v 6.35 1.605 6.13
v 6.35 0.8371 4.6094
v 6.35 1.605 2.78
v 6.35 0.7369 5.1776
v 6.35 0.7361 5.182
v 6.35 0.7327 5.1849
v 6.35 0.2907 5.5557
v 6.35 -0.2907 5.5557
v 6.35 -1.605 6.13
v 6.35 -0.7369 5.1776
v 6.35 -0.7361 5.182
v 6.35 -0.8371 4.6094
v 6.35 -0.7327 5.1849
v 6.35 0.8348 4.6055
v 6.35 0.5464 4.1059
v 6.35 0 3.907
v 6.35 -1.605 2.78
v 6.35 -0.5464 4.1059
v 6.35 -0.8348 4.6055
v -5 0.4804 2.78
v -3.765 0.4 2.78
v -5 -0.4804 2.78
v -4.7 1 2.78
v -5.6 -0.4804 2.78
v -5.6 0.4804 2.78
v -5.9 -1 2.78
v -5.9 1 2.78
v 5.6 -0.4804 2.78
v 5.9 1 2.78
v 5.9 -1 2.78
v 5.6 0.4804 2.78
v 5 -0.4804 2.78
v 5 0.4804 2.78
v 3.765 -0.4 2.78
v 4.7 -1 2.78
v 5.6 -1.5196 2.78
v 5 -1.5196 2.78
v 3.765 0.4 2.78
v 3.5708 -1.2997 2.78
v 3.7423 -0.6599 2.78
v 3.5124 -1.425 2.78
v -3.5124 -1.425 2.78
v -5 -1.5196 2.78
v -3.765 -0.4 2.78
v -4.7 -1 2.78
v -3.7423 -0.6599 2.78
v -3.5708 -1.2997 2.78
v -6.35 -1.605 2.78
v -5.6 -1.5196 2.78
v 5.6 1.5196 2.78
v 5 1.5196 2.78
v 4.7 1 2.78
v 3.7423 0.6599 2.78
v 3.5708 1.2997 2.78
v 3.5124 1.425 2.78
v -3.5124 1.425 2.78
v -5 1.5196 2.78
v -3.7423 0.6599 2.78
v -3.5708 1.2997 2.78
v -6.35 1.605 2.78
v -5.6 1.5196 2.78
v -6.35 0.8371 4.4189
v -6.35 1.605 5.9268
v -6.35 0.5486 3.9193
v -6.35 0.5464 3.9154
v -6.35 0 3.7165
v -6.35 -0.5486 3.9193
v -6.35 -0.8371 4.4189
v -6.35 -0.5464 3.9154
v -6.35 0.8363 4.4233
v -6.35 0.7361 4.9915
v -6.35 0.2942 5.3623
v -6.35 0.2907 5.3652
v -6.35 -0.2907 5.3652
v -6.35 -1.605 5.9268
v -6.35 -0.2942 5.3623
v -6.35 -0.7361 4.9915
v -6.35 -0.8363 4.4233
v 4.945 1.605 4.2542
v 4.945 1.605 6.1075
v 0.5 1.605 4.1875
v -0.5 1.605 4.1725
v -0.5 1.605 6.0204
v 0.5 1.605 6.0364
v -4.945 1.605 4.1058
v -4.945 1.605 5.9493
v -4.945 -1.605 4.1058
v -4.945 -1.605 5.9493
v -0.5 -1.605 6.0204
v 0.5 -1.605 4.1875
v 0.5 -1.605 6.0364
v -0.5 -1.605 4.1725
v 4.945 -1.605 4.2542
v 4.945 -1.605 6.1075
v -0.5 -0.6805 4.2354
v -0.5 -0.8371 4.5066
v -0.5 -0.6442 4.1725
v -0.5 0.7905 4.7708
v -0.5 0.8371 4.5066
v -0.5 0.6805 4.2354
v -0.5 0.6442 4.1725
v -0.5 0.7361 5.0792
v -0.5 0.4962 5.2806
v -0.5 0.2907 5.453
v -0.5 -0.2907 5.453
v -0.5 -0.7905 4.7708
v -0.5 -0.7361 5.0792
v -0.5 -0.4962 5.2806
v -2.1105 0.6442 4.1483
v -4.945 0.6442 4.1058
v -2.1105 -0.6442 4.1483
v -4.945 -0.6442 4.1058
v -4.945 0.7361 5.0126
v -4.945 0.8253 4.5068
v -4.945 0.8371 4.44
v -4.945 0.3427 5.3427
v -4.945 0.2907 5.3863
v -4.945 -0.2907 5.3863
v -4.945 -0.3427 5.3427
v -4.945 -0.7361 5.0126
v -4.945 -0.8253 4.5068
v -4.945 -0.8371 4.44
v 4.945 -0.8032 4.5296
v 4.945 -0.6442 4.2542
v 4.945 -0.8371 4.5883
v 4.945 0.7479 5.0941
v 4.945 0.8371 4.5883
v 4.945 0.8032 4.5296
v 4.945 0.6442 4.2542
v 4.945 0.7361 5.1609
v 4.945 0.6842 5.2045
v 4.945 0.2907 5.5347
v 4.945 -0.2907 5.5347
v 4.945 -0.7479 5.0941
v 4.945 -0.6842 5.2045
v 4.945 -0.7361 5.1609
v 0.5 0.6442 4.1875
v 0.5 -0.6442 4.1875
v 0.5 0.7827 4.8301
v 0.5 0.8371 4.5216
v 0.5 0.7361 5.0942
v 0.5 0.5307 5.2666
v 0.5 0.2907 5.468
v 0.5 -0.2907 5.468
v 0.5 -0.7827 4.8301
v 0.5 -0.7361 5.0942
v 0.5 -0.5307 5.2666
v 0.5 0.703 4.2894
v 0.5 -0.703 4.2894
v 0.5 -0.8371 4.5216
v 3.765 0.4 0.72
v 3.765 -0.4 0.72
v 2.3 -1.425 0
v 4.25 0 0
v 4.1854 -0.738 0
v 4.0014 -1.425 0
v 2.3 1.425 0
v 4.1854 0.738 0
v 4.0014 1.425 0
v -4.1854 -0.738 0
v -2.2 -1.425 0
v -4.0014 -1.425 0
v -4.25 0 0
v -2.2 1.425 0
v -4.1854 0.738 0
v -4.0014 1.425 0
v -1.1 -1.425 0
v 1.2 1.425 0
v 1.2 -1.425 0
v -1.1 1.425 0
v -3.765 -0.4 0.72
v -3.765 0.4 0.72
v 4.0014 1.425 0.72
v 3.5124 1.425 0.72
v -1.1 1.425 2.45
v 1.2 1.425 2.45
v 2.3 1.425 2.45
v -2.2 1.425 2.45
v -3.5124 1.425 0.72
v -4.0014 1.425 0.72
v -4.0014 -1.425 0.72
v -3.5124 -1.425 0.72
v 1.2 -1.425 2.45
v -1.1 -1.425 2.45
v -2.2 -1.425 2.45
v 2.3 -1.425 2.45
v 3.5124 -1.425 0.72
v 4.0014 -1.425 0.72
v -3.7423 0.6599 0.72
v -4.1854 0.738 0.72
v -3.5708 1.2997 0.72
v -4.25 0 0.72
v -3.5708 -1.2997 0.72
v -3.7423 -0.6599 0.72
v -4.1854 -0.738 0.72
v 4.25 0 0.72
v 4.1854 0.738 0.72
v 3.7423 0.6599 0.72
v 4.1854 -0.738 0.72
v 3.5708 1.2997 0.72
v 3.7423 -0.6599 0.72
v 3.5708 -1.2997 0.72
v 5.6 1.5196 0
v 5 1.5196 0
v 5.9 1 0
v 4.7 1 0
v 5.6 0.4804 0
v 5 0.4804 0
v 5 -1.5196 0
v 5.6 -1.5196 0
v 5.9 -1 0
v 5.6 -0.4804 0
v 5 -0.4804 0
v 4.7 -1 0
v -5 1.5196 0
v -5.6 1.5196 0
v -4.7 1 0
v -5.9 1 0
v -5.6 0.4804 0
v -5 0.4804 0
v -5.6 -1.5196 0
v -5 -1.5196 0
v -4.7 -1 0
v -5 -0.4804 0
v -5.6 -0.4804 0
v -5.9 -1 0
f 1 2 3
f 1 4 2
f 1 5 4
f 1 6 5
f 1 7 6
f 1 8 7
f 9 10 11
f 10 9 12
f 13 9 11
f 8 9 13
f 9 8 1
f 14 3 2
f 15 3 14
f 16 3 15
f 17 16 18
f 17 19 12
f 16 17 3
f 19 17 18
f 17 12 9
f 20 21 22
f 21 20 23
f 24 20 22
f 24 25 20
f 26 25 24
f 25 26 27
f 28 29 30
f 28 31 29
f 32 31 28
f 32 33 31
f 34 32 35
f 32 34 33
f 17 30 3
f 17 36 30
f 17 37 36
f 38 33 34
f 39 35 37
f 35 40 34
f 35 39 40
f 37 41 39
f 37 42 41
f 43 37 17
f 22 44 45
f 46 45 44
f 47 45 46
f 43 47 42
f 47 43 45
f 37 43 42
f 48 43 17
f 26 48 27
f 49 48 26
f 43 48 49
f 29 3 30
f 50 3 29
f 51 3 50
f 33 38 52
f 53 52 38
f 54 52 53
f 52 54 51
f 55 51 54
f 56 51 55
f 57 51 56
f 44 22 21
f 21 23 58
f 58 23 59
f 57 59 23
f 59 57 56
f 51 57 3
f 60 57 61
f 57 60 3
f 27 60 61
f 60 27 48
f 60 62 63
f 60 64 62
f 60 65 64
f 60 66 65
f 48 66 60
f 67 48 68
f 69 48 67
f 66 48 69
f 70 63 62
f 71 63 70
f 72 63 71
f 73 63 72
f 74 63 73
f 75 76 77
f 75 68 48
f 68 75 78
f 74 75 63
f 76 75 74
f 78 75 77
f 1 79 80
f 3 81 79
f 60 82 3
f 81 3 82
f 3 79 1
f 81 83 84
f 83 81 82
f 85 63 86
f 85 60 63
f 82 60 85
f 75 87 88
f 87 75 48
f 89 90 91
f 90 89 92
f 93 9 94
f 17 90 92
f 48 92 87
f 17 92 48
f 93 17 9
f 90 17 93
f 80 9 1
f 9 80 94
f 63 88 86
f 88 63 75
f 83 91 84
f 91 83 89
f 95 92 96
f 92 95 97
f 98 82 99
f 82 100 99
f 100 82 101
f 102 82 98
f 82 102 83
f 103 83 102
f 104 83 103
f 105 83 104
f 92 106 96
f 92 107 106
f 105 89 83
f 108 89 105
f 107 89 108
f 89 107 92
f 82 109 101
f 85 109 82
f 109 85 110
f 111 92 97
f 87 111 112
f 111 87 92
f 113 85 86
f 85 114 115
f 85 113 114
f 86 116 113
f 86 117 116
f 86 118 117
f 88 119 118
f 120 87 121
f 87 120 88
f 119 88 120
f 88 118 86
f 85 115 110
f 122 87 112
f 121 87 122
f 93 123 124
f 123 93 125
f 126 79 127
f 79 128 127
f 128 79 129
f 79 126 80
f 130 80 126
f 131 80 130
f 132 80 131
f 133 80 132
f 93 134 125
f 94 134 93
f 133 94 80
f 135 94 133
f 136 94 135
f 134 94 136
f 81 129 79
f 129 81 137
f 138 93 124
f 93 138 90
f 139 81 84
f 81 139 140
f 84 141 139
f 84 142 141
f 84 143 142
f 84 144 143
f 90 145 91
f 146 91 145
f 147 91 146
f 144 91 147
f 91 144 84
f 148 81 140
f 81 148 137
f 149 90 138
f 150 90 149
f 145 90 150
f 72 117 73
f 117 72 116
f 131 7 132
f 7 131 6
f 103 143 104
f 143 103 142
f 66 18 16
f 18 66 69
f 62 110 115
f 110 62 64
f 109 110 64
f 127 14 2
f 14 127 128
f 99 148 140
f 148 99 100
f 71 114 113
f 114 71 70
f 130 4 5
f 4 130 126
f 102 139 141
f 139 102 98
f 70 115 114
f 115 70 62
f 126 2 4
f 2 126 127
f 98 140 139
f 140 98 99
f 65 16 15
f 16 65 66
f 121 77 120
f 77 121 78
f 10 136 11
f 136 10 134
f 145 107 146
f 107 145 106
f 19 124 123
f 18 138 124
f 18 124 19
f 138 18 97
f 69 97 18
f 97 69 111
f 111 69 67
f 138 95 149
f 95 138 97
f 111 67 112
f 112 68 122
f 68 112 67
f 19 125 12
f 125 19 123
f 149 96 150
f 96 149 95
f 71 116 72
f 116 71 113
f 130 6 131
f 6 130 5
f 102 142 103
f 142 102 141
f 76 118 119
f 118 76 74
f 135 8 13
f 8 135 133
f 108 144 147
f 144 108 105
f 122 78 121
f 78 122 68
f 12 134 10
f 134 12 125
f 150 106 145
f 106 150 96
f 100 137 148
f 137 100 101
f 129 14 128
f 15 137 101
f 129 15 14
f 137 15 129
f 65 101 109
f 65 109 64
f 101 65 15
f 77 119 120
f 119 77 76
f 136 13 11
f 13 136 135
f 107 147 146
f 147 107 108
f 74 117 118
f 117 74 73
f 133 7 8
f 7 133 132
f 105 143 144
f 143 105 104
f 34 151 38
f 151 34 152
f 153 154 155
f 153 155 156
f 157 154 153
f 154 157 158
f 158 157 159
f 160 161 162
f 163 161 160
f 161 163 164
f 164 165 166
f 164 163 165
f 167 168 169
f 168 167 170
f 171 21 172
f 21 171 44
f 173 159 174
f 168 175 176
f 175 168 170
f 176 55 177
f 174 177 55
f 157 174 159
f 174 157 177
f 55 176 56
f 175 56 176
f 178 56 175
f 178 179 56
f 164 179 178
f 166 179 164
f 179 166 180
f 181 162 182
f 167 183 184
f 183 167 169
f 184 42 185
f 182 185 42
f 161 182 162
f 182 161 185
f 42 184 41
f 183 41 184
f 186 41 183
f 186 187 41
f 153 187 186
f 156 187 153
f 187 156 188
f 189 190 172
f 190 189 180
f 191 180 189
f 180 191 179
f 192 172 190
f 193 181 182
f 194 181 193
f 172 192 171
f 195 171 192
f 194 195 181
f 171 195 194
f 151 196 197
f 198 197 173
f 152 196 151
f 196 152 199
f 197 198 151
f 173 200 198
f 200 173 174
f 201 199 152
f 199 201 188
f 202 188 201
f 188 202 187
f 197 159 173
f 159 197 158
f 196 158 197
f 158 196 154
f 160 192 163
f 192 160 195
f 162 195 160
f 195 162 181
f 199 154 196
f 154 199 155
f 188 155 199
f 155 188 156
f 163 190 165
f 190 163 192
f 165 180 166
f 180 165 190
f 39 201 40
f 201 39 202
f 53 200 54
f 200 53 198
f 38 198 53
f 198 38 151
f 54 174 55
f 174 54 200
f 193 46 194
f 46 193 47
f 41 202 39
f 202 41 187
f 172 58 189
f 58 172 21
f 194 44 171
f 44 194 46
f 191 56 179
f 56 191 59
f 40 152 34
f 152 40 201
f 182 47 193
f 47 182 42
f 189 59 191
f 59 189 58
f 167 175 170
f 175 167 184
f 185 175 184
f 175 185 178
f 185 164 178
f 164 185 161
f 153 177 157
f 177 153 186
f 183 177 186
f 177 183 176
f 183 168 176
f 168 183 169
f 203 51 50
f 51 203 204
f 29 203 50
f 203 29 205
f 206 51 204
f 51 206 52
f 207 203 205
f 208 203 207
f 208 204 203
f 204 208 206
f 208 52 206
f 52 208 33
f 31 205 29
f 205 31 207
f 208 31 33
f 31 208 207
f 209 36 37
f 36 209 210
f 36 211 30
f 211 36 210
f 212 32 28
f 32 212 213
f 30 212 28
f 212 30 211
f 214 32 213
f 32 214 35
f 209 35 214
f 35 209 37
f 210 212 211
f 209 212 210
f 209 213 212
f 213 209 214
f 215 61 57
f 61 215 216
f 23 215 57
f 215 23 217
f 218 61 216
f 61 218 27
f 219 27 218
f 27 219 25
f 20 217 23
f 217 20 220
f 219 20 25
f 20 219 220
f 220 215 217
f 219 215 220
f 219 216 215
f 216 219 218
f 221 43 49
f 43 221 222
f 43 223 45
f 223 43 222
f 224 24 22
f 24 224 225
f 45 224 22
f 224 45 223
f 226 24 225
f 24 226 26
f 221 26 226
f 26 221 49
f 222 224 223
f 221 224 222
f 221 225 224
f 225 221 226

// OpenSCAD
// Browning 1911-22/1911-380 (not "Pro"), the front sight with fiber optics

stock_width = 3.21;
stock_length = 12.7;
stock_height = 3.35; // rear only - remember that sight must be slanted

// The following two measurements set the slant when used with stock_height.
// front_height = 2.47;
// front_length = 10.54;
// shear = (stock_height - front_height) / front_length;

// We do not repeat the shear of the stock front sight, because it's far
// in excess of the sight line. Instead, we aim the rod (almost) along
// the sight line, so it transmits the most lights to the shooter's eye.
// The top is sheared just a smidge more, so it can't be seen when aiming,
// but not more than that.
shear_rod = 0.015;
shear_top = shear_rod + 0.001;

rod_dia = 1.5 + 0.2;

pawl_z = 2.78;

module rod_channel () {
    $fn = 9;
    rotate(90, [0, 1, 0])
        cylinder(stock_length+0.2, rod_dia/2, rod_dia/2);
}

module rod_slot () {
    // translate([0, (rod_dia*1.3)/2)*-1, 0])
    //     cube([stock_length*0.35, rod_dia*1.3, 7]);

    // This version cuts away everything, in order to collect more light.
    translate([0, ((stock_width+0.2)/2)*-1, 0])
        cube([stock_length*0.35, stock_width+0.2, 7]);
}

// We center the whole part on the center of the attachment.
module main_body () {

    difference () {
        // The main body. Everything else attaches to it. Up is up for now.
        intersection () {
            translate([(stock_length/2)*-1, (stock_width/2)*-1, 0])
                cube([stock_length, stock_width, stock_height]);
            translate([(stock_length/2)*-1, (stock_width/2)*-1,
                       (shear_top*stock_length)*-1])
                multmatrix(m = [[        1,   0,   0,   0],
                                [        0,   1,   0,   0],
                                [shear_top,   0,   1,   0],
                                [        0,   0,   0,   1]])
                {
                    cube([stock_length, stock_width, stock_height]);
                }
        }

        // The rod channel.
        translate([(stock_length/2 + 0.1)*-1, 0,
                    stock_height - stock_width/2 + 0.04]) {
            multmatrix(m = [[        1,   0,   0,   0],
                            [        0,   1,   0,   0],
                            [shear_rod,   0,   1,   0],
                            [        0,   0,   0,   1]])
            {
                rod_channel();
            }
        }

        translate([0, 0, 1.2]) {
            multmatrix(m = [[        1,   0,   0,   0],
                            [        0,   1,   0,   0],
                            [shear_rod,   0,   1,   0],
                            [        0,   0,   0,   1]])
            {
                // The two central slots
                translate([(stock_length*0.35 + 0.5)*-1, 0, 0.20])
                    rod_slot();
                translate([0.5, 0, 0.20])
                    rod_slot();
            }
        }
    }
}

module latch_pawls () {
    // Total X is 8.34 at the ends of the pawls.
    tip_xlen = (8.34-7.53)/2 + 0.2;  // 0.2 for experiments
    tip_ylen = 2.85;
    tip_zlen = 0.72;

    flex_zlen = 2.45;

    pawl_r = 4.25;     // a big bevel, big radius for pawl tips
    pawl_r_sm = 3.8;   // a big bevel, small radius for pawl stems

    difference () {
        intersection () {
            union () {
                translate([(7.53/2)*-1, (tip_ylen/2)*-1, 0])
                    cube([7.53, tip_ylen, pawl_z+0.1]);

                // Pawl tip front
                translate([(7.53/2 + tip_xlen)*-1, (tip_ylen/2)*-1, 0]) {
                    cube([tip_xlen + 0.1, tip_ylen, tip_zlen]);
                }
                // Pawl tip rear
                translate([7.53/2 - 0.1, (tip_ylen/2)*-1, 0]) {
                    cube([tip_xlen + 0.1, tip_ylen, tip_zlen]);
                }
            }

            // Big bevel
            $fn = 36;
            union () {
                translate([0, 0, 0])
                    cylinder(tip_zlen, pawl_r, pawl_r);
                translate([0, 0, tip_zlen])
                    cylinder(pawl_z+0.1, pawl_r_sm, pawl_r_sm);
            }
        }

        // Flex cut-out front
        translate([-2.2, ((tip_ylen+0.2)/2)*-1, -0.1])
            cube([1.1, tip_ylen + 0.2, flex_zlen+0.1]);
        // Flex cut-out rear
        translate([1.2, ((tip_ylen+0.2)/2)*-1, -0.1])
            cube([1.1, tip_ylen+0.2, flex_zlen+0.1]);
    }
}

module support_leg () {
    $fn = 6;
    cylinder(pawl_z+0.1, 0.6, 0.6);
}

module whole_part () {
    translate([0, 0, pawl_z]) {
        main_body();
    }

    translate([0, 0, 0]) {
        latch_pawls();
    }

    translate([ 5.3,  1, 0]) support_leg();
    translate([ 5.3, -1, 0]) support_leg();
    translate([-5.3,  1, 0]) support_leg();
    translate([-5.3, -1, 0]) support_leg();
}

whole_part();
